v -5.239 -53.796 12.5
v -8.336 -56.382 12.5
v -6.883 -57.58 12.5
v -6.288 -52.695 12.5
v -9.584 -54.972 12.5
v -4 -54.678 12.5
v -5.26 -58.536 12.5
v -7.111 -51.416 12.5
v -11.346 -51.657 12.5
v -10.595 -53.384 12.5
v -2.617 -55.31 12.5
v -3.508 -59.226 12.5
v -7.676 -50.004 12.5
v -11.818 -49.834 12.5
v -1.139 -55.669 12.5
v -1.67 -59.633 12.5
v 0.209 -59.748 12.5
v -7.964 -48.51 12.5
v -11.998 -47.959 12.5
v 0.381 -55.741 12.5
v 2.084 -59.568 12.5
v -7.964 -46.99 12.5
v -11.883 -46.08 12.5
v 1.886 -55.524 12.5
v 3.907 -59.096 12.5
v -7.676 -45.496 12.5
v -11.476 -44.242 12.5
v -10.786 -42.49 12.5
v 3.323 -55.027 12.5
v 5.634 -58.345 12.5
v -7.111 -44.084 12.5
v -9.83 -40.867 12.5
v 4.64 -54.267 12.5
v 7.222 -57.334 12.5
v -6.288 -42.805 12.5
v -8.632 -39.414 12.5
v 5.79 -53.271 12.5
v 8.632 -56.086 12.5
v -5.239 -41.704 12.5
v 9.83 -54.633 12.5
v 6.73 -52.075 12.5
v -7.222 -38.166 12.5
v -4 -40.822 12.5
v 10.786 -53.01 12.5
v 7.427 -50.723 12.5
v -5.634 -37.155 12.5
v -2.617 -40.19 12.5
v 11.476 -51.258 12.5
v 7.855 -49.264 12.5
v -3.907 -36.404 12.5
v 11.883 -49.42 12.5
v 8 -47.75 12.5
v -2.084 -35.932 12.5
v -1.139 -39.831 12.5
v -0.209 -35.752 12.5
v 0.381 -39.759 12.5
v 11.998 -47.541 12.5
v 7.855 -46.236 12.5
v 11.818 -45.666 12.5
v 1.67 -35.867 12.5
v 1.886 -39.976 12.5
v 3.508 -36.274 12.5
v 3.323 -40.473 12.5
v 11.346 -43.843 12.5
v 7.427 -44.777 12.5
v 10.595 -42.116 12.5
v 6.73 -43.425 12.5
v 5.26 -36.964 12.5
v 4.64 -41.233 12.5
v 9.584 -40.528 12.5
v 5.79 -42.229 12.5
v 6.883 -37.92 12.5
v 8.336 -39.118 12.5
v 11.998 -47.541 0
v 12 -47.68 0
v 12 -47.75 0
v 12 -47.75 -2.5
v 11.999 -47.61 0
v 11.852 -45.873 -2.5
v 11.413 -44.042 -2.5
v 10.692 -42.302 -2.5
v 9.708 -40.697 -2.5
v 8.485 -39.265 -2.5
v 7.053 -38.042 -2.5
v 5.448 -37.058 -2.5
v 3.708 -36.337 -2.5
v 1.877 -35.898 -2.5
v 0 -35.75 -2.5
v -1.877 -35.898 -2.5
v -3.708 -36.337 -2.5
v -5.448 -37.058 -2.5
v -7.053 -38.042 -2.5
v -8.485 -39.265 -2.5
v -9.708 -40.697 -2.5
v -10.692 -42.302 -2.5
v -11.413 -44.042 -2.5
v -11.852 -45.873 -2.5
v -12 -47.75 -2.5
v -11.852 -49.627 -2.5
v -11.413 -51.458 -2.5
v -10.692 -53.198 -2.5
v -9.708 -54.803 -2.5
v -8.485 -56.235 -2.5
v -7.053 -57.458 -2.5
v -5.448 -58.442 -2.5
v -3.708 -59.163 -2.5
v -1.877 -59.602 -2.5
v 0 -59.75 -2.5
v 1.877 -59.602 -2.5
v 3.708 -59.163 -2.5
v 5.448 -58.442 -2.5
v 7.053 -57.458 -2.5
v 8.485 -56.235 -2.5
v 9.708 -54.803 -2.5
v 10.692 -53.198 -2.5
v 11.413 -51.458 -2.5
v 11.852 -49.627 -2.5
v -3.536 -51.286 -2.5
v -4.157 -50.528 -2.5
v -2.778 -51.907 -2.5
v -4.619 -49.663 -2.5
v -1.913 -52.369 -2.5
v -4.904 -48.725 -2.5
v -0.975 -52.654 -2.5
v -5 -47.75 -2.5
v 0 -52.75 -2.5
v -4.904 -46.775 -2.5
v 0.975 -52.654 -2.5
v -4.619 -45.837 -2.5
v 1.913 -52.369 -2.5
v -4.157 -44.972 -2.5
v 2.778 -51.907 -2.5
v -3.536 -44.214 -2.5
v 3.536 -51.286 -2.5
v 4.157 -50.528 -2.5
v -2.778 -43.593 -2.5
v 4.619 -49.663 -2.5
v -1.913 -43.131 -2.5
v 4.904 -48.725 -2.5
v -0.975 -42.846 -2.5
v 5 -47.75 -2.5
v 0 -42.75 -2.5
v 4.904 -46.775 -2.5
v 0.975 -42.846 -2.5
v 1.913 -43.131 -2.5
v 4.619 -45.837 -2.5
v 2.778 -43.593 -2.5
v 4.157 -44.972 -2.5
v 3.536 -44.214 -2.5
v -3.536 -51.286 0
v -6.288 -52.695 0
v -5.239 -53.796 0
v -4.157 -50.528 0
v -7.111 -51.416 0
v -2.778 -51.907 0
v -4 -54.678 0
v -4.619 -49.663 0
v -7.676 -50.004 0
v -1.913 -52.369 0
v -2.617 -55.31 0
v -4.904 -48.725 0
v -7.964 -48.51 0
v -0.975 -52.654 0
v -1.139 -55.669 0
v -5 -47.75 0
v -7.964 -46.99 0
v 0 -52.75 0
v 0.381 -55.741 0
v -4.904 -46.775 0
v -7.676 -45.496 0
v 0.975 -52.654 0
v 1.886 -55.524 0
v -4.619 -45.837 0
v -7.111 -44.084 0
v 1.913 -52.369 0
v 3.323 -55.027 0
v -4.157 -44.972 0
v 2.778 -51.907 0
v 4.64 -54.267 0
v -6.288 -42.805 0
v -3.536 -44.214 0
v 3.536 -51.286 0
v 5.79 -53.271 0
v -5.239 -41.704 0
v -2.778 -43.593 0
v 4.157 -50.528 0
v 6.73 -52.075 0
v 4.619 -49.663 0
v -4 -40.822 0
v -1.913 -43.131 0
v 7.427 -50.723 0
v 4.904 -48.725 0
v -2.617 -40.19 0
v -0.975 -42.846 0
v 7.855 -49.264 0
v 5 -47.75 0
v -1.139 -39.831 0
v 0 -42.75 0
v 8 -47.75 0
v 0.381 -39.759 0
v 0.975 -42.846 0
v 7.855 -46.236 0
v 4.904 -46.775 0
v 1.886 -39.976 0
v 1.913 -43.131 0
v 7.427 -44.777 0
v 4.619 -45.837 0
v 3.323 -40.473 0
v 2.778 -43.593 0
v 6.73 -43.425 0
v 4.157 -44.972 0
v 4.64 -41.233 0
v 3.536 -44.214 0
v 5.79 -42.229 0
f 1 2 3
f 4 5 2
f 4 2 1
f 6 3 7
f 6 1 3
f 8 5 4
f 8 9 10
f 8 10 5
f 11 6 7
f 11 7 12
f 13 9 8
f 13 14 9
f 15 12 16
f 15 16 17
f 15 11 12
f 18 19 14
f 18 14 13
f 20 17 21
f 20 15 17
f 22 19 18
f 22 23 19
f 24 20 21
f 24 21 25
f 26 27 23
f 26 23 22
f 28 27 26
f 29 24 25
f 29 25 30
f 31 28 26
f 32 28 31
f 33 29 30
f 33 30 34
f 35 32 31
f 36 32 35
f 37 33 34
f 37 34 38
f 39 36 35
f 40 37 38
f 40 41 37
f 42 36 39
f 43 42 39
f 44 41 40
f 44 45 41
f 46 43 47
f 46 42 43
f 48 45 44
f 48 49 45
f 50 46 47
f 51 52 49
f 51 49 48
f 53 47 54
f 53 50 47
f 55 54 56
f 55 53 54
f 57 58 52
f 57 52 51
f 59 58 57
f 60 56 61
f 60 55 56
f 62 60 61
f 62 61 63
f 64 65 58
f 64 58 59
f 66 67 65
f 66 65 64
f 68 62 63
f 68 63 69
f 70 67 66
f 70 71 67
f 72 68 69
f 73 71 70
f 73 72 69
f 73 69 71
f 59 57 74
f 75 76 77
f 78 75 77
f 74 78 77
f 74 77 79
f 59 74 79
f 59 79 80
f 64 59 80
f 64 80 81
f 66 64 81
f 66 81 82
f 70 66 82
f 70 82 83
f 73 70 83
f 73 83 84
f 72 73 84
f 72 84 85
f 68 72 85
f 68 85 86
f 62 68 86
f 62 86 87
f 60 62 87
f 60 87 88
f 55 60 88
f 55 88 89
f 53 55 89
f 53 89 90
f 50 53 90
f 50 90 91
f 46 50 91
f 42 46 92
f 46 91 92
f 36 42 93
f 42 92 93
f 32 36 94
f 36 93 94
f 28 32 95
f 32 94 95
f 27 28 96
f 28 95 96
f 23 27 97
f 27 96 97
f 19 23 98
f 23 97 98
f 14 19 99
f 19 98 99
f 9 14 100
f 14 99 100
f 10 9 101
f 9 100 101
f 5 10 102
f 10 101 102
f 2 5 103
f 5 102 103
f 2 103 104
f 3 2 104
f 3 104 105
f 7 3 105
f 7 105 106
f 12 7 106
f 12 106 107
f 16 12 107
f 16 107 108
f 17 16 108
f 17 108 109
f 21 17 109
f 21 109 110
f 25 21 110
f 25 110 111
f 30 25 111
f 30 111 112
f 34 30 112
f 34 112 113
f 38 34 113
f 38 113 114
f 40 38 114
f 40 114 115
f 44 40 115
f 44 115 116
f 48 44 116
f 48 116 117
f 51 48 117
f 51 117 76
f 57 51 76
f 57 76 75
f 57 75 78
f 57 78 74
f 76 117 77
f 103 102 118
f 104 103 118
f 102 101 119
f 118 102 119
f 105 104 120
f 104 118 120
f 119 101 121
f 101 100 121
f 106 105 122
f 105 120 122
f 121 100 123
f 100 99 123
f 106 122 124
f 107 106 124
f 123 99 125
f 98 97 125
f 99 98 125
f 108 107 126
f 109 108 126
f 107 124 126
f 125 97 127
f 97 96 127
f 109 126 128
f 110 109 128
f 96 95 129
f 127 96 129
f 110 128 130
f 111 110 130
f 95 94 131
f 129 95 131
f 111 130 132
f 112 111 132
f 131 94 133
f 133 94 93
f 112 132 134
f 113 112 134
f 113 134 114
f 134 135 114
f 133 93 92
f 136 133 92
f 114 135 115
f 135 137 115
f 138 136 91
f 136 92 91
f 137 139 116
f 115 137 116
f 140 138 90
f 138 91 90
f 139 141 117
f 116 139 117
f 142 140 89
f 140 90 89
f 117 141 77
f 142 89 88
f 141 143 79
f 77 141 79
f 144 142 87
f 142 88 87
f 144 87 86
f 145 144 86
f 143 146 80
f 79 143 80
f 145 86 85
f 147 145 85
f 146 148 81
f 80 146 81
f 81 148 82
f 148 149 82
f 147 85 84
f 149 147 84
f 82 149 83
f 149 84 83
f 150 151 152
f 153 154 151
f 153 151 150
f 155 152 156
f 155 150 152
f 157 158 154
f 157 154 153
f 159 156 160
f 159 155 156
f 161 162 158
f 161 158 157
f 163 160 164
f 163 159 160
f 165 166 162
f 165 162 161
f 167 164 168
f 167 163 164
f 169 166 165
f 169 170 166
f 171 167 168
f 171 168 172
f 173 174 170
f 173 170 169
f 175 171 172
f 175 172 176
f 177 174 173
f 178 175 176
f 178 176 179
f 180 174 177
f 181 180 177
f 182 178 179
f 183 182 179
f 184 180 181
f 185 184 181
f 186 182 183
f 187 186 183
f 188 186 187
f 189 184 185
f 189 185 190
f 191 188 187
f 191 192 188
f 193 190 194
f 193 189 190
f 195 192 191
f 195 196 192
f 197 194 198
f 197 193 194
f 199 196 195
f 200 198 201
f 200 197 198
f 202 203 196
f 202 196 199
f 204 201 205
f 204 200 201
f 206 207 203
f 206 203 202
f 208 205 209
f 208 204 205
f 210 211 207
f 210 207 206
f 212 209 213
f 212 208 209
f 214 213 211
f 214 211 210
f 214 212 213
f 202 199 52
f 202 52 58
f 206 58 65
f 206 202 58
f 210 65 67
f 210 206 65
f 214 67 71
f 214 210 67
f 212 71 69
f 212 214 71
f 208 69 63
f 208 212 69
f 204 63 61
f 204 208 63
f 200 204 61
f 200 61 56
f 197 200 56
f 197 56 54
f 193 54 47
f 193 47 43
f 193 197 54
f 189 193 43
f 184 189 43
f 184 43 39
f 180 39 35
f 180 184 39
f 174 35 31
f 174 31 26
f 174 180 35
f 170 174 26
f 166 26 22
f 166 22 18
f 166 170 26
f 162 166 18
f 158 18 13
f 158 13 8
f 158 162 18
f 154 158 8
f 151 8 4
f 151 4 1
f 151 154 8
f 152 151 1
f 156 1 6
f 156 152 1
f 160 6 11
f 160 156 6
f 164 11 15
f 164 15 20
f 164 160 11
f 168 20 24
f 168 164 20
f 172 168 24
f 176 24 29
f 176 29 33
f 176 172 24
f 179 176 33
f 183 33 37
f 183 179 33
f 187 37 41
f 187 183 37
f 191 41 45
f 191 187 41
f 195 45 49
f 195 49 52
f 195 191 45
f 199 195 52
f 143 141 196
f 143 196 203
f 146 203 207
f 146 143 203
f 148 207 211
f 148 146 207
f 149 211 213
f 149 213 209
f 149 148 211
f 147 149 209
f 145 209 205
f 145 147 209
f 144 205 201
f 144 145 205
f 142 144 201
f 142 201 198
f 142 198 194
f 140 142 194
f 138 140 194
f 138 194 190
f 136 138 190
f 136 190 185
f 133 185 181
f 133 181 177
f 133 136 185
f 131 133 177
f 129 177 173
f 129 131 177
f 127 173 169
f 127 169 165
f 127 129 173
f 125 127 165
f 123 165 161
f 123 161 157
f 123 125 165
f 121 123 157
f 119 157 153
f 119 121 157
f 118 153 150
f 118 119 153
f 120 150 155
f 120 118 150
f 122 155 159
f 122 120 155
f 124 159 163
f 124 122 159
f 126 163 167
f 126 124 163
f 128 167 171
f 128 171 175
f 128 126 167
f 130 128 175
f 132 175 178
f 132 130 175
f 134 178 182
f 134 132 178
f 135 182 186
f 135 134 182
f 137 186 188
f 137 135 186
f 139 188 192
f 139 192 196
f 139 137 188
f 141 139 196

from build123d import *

# Parameters (mm, degrees)
CYLINDER024_R               = 5
CYLINDER024_DEPTH           = 2.5
CYLINDER019_R               = 12
CYLINDER019_DEPTH           = 2.5
CYLINDER027_R               = 8
CYLINDER027_DEPTH           = 12.5
CYLINDER026_R               = 12
CYLINDER026_DEPTH           = 12.5
CYLINDER026_PLACEMENT_ANGLE = 1


with BuildPart() as largeplughole:
    # Cylinder024 → Cylinder024 (new body)
    with BuildSketch(Plane.XY):
        Circle(CYLINDER024_R)
    extrude(amount=CYLINDER024_DEPTH)


with BuildPart() as largeplugbase001:
    # Cylinder019 → Cylinder019 (new body)
    with BuildSketch(Plane.XY):
        Circle(CYLINDER019_R)
    extrude(amount=CYLINDER019_DEPTH)

    # Cut008: cut LargePlugHole
    add(largeplughole.part, mode=Mode.SUBTRACT)


with BuildPart() as largeplugwallhole:
    # Cylinder027 → Cylinder027 (new body)
    with BuildSketch(Plane.XY.offset(2.5)):
        Circle(CYLINDER027_R)
    extrude(amount=CYLINDER027_DEPTH)


with BuildPart() as vrm2_in_adapter:
    # Cylinder026 → Cylinder026 (new body)
    with BuildSketch(Plane.XY):
        Circle(CYLINDER026_R)
    extrude(amount=CYLINDER026_DEPTH)


with BuildPart() as vrm2_in_adapter_1:
    # Cylinder026 placement: moved
    add(vrm2_in_adapter.part.moved(Location((0, 0, 2.5))).rotate(Axis((0, 0, 2.5), (0, 0, 1)), CYLINDER026_PLACEMENT_ANGLE))

    # Cut007: cut LargePlugWallHole
    add(largeplugwallhole.part, mode=Mode.SUBTRACT)

    # Fusion028: union LargePlugBase001
    add(largeplugbase001.part)


with BuildPart() as vrm2_in_adapter_2:
    # Fusion028 placement: moved
    add(vrm2_in_adapter_1.part.moved(Location((0, -47.75, -2.5))))


solid = vrm2_in_adapter_2.part
